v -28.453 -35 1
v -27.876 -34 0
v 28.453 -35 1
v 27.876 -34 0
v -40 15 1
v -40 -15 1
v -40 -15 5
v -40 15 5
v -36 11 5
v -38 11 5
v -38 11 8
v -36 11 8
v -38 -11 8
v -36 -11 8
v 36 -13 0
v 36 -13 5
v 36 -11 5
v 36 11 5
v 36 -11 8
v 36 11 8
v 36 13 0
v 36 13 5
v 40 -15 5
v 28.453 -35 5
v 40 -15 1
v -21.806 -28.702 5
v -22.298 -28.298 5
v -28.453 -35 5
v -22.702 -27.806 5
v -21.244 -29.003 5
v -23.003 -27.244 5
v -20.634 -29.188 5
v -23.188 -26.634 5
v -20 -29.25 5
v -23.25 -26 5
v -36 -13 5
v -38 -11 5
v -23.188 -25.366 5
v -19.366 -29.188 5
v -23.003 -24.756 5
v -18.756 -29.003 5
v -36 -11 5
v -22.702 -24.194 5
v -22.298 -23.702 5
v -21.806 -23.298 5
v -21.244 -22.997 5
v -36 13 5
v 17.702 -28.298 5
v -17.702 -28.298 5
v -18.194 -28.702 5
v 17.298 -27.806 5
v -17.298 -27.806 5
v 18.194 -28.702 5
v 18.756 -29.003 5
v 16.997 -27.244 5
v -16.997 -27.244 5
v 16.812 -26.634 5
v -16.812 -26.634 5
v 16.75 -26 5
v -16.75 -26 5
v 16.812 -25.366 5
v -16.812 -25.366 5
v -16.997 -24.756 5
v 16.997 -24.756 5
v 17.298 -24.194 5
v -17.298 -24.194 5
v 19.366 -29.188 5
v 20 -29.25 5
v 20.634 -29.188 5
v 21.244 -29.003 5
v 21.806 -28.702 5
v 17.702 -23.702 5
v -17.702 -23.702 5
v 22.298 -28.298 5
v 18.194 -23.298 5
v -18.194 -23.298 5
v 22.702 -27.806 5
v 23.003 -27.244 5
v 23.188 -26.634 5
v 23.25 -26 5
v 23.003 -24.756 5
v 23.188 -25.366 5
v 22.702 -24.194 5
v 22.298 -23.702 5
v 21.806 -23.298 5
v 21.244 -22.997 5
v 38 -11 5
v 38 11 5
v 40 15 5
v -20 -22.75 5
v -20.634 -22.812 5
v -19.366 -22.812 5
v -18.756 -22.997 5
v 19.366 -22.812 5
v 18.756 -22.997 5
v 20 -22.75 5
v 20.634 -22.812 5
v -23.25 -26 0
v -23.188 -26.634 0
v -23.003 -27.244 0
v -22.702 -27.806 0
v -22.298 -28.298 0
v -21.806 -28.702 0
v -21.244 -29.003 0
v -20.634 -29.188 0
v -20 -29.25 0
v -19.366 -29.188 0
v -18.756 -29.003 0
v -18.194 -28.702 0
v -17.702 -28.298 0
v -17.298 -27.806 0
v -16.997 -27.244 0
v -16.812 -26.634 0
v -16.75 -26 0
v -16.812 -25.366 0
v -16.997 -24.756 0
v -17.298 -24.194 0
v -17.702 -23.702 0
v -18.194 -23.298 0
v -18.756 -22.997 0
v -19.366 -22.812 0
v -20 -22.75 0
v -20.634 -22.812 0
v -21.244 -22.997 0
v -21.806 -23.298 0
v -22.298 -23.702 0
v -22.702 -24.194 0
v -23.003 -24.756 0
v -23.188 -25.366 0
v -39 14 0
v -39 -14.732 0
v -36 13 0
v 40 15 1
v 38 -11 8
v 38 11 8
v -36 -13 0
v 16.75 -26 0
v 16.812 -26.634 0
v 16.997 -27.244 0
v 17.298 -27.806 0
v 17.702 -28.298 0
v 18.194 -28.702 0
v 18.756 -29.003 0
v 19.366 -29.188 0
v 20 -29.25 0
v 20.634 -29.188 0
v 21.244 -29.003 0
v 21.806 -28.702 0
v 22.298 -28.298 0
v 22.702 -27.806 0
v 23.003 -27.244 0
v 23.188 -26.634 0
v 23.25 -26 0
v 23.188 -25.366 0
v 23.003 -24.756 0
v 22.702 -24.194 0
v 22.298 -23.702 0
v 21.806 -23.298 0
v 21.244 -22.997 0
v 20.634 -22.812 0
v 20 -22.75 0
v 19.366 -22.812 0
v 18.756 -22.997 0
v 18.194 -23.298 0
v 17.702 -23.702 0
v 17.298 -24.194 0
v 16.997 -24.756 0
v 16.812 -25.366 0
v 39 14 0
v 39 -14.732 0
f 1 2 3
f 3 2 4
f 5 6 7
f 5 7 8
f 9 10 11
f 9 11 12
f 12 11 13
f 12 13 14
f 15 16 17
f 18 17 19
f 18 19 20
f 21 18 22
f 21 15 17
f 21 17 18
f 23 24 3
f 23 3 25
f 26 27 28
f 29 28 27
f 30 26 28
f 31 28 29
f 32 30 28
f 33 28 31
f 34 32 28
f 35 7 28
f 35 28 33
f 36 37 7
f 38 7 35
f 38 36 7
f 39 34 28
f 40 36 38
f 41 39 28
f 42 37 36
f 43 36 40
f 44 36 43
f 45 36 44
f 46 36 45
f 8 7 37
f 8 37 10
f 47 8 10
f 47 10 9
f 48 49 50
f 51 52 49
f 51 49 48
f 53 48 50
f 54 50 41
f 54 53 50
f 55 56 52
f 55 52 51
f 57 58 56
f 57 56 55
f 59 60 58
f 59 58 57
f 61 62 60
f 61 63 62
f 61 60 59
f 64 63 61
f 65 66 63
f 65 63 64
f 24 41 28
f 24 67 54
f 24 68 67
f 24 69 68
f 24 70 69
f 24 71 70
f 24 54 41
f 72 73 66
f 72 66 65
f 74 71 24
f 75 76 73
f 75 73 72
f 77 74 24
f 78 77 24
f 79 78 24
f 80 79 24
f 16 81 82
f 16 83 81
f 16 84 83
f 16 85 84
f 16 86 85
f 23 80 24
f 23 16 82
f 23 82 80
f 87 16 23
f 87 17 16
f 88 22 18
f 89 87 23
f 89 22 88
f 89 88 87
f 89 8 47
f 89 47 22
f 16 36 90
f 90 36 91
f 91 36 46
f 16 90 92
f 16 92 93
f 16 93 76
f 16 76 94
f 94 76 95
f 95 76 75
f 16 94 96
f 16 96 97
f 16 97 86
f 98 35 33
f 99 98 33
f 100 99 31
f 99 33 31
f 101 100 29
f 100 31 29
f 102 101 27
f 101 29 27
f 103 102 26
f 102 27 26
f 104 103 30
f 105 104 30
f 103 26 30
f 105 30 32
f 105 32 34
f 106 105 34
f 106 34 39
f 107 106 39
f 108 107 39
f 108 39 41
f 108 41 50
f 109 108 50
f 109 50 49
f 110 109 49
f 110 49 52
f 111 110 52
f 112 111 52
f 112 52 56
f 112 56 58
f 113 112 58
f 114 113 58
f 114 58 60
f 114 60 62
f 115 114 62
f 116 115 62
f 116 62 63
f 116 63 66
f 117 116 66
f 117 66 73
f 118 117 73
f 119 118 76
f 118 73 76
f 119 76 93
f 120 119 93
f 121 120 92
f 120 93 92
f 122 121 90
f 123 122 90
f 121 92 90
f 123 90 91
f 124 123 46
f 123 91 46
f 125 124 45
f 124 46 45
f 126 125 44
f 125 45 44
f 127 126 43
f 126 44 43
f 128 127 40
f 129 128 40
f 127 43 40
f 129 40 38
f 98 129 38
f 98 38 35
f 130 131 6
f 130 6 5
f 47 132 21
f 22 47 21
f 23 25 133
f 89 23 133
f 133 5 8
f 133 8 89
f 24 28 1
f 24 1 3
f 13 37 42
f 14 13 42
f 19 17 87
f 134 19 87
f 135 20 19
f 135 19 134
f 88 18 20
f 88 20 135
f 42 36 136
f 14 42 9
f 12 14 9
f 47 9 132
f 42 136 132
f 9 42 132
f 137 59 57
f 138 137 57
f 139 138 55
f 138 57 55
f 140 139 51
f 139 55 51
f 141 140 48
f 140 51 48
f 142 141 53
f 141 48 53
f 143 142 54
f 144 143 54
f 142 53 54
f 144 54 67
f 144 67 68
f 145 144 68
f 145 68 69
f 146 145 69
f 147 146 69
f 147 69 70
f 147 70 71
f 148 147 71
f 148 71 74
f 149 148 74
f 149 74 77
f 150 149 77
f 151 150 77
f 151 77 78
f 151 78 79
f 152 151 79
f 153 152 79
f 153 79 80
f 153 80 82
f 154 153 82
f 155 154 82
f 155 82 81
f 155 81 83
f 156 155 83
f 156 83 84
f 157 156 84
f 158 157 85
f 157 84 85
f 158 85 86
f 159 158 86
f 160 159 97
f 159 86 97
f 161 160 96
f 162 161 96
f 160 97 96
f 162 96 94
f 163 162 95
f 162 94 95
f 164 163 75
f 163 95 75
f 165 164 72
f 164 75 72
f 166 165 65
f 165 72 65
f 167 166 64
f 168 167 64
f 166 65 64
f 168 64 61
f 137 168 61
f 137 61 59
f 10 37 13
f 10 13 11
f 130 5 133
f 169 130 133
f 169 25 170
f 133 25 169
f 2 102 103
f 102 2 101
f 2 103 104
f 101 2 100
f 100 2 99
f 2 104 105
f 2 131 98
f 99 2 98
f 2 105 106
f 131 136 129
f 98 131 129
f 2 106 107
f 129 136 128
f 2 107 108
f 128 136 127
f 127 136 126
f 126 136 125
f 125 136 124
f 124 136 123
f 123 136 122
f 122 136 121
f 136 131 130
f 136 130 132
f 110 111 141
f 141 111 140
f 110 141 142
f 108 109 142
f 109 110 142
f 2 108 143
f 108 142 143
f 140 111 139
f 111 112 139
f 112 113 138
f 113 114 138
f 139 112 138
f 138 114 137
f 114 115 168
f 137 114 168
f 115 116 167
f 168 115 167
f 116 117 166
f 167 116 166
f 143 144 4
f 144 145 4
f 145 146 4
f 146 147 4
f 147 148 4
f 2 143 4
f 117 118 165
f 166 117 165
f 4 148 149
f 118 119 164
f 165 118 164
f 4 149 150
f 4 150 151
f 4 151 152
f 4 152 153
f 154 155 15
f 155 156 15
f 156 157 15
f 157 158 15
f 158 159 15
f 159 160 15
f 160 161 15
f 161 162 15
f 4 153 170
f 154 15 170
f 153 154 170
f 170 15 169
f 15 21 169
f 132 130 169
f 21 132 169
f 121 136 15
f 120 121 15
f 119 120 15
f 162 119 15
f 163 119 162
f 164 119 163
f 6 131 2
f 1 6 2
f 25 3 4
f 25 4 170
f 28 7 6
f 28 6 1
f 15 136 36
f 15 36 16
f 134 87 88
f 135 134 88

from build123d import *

# Parameters (mm, degrees)
F0_W     = 80
F0_H     = 30
F0_W_2   = 72
F0_H_2   = 26
F1_DEPTH = 5
F2_W     = 2
F2_H     = 22
F3_DEPTH = 3
F5_DEPTH = 5
F6_SIZE  = 1
F8_D     = 6.5
F9_D     = 6.5


with BuildPart() as f1:
    # F0 (on Top) → F1 (new body)
    with BuildSketch(Plane.XY):
        Rectangle(F0_W, F0_H)
        Rectangle(F0_W_2, F0_H_2, mode=Mode.SUBTRACT)
    extrude(amount=F1_DEPTH)

    # F2 (on face) → F3 (join)
    with BuildSketch(Plane.XY.offset(5)):
        with Locations((-37, 0)):
            Rectangle(F2_W, F2_H)
        with Locations((37, 0)):
            Rectangle(F2_W, F2_H)
    extrude(amount=F3_DEPTH)

    # F4 (on face) → F5 (join)
    with BuildSketch(Plane.XY.offset(5)):
        Polygon((40, -15), (-40, -15), (-28.4529946162, -35), (28.4529946162, -35), align=None)
    extrude(amount=-F5_DEPTH)

    # F6
    f6_edges = [f1.edges().sort_by_distance(p)[0] for p in [
        (0, 15, 0),
        (-40, 0, 0),
        (40, 0, 0),
        (34.226497, -25, 0),
        (0, -35, 0),
        (-34.226497, -25, 0),
    ]]
    chamfer(f6_edges, length=F6_SIZE)

    # F8 (through all)
    with Locations(Plane(origin=(0, 0, 0), x_dir=(1, 0, 0), z_dir=(0, 0, -1))):
        with Locations((20, 26)):
            Hole(F8_D / 2)

    # F9 (through all)
    with Locations(Plane(origin=(0, 0, 0), x_dir=(1, 0, 0), z_dir=(0, 0, -1))):
        with Locations((-20, 26)):
            Hole(F9_D / 2)


solid = f1.part
